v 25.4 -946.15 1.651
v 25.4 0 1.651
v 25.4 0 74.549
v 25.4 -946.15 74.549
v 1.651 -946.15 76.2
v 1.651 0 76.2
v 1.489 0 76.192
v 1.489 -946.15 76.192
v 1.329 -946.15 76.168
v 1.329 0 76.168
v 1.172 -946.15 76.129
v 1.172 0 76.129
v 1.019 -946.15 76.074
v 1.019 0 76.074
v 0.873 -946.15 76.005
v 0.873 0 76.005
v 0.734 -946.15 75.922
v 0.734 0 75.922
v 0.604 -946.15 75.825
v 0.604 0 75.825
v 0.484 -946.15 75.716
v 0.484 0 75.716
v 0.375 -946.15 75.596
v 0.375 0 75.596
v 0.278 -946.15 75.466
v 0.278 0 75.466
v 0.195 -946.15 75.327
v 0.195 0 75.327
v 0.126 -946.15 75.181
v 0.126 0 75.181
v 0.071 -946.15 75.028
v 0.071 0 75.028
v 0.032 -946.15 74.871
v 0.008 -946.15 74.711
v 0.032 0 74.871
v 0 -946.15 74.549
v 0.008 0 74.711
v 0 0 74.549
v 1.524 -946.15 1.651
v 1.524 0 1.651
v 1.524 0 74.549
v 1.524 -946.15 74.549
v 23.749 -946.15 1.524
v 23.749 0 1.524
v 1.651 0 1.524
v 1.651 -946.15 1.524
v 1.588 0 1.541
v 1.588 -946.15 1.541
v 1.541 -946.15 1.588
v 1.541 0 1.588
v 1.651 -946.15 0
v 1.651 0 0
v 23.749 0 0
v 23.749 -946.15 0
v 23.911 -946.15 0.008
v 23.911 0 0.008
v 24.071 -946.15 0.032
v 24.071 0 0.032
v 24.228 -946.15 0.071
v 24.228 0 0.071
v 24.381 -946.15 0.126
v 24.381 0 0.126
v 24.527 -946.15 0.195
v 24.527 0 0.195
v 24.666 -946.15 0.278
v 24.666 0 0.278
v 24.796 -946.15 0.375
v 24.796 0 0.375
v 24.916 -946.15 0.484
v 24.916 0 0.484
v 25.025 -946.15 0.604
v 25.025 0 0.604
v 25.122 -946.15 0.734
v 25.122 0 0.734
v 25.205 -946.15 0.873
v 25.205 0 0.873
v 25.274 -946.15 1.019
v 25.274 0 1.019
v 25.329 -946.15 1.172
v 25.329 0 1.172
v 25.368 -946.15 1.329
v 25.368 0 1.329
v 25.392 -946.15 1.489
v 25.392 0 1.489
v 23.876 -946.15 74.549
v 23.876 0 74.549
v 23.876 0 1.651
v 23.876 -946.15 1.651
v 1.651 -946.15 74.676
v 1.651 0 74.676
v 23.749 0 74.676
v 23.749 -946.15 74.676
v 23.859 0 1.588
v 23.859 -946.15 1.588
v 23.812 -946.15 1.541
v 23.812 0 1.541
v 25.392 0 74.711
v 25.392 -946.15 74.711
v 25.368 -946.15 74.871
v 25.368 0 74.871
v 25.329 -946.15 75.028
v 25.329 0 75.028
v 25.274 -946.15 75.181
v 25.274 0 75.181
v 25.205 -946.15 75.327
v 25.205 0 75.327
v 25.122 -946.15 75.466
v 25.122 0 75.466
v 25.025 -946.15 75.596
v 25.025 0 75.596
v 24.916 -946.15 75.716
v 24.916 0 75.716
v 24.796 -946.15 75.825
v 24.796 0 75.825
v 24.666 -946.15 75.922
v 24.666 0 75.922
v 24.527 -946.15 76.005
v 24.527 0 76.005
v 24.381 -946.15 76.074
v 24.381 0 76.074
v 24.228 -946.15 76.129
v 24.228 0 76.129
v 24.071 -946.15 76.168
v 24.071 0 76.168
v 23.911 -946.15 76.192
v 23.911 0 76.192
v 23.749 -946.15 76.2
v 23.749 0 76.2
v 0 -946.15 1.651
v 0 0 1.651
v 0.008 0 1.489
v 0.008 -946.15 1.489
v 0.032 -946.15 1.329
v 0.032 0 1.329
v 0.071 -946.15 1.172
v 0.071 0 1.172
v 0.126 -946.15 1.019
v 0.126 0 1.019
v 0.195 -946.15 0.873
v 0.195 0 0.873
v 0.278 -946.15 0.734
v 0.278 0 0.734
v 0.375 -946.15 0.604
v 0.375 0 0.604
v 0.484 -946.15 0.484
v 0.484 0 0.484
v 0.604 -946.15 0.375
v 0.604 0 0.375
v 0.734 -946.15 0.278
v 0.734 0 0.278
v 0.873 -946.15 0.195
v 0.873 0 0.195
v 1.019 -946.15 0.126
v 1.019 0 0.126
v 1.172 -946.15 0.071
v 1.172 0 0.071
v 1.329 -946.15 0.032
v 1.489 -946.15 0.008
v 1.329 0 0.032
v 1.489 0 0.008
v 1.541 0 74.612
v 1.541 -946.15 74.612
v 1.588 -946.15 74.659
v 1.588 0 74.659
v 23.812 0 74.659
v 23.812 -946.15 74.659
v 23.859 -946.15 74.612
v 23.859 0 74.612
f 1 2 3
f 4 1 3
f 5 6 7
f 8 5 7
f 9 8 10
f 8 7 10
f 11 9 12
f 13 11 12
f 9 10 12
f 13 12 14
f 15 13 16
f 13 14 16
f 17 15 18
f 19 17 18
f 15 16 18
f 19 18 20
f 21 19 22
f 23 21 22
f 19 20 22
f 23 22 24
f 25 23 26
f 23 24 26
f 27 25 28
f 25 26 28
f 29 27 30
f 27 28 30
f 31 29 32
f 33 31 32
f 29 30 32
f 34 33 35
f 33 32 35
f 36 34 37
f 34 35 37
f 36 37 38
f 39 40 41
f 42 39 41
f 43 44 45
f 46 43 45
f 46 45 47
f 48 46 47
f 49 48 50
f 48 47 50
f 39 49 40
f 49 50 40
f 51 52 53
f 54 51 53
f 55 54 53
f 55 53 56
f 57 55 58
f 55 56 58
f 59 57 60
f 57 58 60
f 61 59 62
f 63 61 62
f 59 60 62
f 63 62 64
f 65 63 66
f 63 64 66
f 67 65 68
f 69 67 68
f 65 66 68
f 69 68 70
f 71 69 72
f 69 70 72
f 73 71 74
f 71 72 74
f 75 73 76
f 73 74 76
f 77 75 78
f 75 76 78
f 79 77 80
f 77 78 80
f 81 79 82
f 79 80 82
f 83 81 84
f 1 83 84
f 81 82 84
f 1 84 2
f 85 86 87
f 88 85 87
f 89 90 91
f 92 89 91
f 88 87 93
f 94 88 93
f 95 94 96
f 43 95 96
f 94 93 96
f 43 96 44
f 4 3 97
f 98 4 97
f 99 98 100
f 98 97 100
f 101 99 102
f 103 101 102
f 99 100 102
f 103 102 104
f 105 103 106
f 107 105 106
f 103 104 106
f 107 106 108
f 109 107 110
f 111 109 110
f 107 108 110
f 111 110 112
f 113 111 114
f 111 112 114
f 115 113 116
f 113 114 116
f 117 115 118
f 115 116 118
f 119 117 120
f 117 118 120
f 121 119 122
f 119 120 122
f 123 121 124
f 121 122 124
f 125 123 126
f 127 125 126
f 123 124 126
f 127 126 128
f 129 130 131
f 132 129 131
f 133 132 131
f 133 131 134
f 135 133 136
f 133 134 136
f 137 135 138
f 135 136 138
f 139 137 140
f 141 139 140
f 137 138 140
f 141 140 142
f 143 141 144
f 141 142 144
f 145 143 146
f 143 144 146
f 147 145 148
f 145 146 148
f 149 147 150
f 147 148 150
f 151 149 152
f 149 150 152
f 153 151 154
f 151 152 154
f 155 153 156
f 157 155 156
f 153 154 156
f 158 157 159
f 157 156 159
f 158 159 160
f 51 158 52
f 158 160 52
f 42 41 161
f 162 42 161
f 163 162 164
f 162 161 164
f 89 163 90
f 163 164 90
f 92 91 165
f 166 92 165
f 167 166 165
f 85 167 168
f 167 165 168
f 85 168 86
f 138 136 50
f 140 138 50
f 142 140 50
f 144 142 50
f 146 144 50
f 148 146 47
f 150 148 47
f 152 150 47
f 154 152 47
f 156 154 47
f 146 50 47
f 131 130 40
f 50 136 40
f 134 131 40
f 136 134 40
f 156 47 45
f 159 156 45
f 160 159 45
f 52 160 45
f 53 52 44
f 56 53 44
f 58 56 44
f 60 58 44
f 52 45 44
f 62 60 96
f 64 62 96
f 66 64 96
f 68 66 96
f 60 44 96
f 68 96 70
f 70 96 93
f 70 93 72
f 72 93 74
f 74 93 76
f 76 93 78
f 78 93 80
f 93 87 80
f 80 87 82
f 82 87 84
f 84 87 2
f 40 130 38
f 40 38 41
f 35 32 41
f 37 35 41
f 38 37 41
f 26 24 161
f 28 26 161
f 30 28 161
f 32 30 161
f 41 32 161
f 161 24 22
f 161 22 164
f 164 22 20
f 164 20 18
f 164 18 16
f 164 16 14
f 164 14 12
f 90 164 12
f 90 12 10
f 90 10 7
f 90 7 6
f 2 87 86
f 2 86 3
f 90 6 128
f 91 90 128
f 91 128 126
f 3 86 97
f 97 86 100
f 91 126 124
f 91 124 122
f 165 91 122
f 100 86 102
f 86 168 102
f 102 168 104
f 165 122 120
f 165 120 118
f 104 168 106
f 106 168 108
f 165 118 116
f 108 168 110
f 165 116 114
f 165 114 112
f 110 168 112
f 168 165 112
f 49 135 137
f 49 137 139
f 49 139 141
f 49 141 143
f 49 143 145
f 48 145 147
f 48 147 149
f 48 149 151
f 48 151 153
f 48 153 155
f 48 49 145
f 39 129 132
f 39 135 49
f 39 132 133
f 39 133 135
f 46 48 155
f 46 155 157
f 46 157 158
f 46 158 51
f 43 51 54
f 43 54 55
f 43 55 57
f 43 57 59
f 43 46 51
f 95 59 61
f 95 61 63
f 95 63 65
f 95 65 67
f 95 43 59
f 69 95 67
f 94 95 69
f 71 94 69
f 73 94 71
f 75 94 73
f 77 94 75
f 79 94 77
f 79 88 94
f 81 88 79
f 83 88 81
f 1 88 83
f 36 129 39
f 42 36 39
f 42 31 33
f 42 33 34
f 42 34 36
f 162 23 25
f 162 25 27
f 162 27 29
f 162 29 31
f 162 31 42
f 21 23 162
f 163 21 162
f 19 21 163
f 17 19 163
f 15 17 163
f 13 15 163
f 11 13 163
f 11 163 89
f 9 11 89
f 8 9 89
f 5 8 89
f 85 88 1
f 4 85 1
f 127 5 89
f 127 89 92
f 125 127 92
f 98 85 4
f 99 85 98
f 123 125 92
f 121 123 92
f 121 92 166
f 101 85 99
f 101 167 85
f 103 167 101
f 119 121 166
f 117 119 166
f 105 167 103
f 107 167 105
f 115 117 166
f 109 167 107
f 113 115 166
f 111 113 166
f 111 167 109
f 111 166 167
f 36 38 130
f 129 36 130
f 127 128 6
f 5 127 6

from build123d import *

# Parameters (mm, degrees)
F1_DEPTH = 946.15


# Not quite as in the source:
# - a feature names something its author has since deleted; it is built from what else it names


with BuildPart() as f1:
    # F0 (on Front) → F1 (new body)
    with BuildSketch(Plane.XZ):
        with BuildLine():
            ThreePointArc((0, 1.651), (0.4835667043, 0.4835667043), (1.651, 0))
            Line((1.651, 0), (23.749, 0))
            ThreePointArc((23.749, 0), (24.9164332957, 0.4835667043), (25.4, 1.651))
            Line((25.4, 1.651), (25.4, 74.549))
            ThreePointArc((25.4, 74.549), (24.9164332957, 75.7164332957), (23.749, 76.2))
            Line((23.749, 76.2), (1.651, 76.2))
            ThreePointArc((1.651, 76.2), (0.4835667043, 75.7164332957), (0, 74.549))
            Line((0, 74.549), (0, 1.651))
        make_face()
        with BuildLine():
            ThreePointArc((1.5240004182, 74.549), (1.5611977345, 74.6388022655), (1.651, 74.6759995818))
            Line((1.651, 74.6759995818), (23.749, 74.6759995818))
            ThreePointArc((23.749, 74.6759995818), (23.8388022655, 74.6388022655), (23.8759995818, 74.549))
            Line((23.8759995818, 74.549), (23.8759995818, 1.651))
            ThreePointArc((23.8759995818, 1.651), (23.8388022655, 1.5611977345), (23.749, 1.5240004182))
            Line((23.749, 1.5240004182), (1.651, 1.5240004182))
            ThreePointArc((1.651, 1.5240004182), (1.5611977345, 1.5611977345), (1.5240004182, 1.651))
            Line((1.5240004182, 1.651), (1.5240004182, 74.549))
        make_face(mode=Mode.SUBTRACT)
    extrude(amount=F1_DEPTH)


solid = f1.part
